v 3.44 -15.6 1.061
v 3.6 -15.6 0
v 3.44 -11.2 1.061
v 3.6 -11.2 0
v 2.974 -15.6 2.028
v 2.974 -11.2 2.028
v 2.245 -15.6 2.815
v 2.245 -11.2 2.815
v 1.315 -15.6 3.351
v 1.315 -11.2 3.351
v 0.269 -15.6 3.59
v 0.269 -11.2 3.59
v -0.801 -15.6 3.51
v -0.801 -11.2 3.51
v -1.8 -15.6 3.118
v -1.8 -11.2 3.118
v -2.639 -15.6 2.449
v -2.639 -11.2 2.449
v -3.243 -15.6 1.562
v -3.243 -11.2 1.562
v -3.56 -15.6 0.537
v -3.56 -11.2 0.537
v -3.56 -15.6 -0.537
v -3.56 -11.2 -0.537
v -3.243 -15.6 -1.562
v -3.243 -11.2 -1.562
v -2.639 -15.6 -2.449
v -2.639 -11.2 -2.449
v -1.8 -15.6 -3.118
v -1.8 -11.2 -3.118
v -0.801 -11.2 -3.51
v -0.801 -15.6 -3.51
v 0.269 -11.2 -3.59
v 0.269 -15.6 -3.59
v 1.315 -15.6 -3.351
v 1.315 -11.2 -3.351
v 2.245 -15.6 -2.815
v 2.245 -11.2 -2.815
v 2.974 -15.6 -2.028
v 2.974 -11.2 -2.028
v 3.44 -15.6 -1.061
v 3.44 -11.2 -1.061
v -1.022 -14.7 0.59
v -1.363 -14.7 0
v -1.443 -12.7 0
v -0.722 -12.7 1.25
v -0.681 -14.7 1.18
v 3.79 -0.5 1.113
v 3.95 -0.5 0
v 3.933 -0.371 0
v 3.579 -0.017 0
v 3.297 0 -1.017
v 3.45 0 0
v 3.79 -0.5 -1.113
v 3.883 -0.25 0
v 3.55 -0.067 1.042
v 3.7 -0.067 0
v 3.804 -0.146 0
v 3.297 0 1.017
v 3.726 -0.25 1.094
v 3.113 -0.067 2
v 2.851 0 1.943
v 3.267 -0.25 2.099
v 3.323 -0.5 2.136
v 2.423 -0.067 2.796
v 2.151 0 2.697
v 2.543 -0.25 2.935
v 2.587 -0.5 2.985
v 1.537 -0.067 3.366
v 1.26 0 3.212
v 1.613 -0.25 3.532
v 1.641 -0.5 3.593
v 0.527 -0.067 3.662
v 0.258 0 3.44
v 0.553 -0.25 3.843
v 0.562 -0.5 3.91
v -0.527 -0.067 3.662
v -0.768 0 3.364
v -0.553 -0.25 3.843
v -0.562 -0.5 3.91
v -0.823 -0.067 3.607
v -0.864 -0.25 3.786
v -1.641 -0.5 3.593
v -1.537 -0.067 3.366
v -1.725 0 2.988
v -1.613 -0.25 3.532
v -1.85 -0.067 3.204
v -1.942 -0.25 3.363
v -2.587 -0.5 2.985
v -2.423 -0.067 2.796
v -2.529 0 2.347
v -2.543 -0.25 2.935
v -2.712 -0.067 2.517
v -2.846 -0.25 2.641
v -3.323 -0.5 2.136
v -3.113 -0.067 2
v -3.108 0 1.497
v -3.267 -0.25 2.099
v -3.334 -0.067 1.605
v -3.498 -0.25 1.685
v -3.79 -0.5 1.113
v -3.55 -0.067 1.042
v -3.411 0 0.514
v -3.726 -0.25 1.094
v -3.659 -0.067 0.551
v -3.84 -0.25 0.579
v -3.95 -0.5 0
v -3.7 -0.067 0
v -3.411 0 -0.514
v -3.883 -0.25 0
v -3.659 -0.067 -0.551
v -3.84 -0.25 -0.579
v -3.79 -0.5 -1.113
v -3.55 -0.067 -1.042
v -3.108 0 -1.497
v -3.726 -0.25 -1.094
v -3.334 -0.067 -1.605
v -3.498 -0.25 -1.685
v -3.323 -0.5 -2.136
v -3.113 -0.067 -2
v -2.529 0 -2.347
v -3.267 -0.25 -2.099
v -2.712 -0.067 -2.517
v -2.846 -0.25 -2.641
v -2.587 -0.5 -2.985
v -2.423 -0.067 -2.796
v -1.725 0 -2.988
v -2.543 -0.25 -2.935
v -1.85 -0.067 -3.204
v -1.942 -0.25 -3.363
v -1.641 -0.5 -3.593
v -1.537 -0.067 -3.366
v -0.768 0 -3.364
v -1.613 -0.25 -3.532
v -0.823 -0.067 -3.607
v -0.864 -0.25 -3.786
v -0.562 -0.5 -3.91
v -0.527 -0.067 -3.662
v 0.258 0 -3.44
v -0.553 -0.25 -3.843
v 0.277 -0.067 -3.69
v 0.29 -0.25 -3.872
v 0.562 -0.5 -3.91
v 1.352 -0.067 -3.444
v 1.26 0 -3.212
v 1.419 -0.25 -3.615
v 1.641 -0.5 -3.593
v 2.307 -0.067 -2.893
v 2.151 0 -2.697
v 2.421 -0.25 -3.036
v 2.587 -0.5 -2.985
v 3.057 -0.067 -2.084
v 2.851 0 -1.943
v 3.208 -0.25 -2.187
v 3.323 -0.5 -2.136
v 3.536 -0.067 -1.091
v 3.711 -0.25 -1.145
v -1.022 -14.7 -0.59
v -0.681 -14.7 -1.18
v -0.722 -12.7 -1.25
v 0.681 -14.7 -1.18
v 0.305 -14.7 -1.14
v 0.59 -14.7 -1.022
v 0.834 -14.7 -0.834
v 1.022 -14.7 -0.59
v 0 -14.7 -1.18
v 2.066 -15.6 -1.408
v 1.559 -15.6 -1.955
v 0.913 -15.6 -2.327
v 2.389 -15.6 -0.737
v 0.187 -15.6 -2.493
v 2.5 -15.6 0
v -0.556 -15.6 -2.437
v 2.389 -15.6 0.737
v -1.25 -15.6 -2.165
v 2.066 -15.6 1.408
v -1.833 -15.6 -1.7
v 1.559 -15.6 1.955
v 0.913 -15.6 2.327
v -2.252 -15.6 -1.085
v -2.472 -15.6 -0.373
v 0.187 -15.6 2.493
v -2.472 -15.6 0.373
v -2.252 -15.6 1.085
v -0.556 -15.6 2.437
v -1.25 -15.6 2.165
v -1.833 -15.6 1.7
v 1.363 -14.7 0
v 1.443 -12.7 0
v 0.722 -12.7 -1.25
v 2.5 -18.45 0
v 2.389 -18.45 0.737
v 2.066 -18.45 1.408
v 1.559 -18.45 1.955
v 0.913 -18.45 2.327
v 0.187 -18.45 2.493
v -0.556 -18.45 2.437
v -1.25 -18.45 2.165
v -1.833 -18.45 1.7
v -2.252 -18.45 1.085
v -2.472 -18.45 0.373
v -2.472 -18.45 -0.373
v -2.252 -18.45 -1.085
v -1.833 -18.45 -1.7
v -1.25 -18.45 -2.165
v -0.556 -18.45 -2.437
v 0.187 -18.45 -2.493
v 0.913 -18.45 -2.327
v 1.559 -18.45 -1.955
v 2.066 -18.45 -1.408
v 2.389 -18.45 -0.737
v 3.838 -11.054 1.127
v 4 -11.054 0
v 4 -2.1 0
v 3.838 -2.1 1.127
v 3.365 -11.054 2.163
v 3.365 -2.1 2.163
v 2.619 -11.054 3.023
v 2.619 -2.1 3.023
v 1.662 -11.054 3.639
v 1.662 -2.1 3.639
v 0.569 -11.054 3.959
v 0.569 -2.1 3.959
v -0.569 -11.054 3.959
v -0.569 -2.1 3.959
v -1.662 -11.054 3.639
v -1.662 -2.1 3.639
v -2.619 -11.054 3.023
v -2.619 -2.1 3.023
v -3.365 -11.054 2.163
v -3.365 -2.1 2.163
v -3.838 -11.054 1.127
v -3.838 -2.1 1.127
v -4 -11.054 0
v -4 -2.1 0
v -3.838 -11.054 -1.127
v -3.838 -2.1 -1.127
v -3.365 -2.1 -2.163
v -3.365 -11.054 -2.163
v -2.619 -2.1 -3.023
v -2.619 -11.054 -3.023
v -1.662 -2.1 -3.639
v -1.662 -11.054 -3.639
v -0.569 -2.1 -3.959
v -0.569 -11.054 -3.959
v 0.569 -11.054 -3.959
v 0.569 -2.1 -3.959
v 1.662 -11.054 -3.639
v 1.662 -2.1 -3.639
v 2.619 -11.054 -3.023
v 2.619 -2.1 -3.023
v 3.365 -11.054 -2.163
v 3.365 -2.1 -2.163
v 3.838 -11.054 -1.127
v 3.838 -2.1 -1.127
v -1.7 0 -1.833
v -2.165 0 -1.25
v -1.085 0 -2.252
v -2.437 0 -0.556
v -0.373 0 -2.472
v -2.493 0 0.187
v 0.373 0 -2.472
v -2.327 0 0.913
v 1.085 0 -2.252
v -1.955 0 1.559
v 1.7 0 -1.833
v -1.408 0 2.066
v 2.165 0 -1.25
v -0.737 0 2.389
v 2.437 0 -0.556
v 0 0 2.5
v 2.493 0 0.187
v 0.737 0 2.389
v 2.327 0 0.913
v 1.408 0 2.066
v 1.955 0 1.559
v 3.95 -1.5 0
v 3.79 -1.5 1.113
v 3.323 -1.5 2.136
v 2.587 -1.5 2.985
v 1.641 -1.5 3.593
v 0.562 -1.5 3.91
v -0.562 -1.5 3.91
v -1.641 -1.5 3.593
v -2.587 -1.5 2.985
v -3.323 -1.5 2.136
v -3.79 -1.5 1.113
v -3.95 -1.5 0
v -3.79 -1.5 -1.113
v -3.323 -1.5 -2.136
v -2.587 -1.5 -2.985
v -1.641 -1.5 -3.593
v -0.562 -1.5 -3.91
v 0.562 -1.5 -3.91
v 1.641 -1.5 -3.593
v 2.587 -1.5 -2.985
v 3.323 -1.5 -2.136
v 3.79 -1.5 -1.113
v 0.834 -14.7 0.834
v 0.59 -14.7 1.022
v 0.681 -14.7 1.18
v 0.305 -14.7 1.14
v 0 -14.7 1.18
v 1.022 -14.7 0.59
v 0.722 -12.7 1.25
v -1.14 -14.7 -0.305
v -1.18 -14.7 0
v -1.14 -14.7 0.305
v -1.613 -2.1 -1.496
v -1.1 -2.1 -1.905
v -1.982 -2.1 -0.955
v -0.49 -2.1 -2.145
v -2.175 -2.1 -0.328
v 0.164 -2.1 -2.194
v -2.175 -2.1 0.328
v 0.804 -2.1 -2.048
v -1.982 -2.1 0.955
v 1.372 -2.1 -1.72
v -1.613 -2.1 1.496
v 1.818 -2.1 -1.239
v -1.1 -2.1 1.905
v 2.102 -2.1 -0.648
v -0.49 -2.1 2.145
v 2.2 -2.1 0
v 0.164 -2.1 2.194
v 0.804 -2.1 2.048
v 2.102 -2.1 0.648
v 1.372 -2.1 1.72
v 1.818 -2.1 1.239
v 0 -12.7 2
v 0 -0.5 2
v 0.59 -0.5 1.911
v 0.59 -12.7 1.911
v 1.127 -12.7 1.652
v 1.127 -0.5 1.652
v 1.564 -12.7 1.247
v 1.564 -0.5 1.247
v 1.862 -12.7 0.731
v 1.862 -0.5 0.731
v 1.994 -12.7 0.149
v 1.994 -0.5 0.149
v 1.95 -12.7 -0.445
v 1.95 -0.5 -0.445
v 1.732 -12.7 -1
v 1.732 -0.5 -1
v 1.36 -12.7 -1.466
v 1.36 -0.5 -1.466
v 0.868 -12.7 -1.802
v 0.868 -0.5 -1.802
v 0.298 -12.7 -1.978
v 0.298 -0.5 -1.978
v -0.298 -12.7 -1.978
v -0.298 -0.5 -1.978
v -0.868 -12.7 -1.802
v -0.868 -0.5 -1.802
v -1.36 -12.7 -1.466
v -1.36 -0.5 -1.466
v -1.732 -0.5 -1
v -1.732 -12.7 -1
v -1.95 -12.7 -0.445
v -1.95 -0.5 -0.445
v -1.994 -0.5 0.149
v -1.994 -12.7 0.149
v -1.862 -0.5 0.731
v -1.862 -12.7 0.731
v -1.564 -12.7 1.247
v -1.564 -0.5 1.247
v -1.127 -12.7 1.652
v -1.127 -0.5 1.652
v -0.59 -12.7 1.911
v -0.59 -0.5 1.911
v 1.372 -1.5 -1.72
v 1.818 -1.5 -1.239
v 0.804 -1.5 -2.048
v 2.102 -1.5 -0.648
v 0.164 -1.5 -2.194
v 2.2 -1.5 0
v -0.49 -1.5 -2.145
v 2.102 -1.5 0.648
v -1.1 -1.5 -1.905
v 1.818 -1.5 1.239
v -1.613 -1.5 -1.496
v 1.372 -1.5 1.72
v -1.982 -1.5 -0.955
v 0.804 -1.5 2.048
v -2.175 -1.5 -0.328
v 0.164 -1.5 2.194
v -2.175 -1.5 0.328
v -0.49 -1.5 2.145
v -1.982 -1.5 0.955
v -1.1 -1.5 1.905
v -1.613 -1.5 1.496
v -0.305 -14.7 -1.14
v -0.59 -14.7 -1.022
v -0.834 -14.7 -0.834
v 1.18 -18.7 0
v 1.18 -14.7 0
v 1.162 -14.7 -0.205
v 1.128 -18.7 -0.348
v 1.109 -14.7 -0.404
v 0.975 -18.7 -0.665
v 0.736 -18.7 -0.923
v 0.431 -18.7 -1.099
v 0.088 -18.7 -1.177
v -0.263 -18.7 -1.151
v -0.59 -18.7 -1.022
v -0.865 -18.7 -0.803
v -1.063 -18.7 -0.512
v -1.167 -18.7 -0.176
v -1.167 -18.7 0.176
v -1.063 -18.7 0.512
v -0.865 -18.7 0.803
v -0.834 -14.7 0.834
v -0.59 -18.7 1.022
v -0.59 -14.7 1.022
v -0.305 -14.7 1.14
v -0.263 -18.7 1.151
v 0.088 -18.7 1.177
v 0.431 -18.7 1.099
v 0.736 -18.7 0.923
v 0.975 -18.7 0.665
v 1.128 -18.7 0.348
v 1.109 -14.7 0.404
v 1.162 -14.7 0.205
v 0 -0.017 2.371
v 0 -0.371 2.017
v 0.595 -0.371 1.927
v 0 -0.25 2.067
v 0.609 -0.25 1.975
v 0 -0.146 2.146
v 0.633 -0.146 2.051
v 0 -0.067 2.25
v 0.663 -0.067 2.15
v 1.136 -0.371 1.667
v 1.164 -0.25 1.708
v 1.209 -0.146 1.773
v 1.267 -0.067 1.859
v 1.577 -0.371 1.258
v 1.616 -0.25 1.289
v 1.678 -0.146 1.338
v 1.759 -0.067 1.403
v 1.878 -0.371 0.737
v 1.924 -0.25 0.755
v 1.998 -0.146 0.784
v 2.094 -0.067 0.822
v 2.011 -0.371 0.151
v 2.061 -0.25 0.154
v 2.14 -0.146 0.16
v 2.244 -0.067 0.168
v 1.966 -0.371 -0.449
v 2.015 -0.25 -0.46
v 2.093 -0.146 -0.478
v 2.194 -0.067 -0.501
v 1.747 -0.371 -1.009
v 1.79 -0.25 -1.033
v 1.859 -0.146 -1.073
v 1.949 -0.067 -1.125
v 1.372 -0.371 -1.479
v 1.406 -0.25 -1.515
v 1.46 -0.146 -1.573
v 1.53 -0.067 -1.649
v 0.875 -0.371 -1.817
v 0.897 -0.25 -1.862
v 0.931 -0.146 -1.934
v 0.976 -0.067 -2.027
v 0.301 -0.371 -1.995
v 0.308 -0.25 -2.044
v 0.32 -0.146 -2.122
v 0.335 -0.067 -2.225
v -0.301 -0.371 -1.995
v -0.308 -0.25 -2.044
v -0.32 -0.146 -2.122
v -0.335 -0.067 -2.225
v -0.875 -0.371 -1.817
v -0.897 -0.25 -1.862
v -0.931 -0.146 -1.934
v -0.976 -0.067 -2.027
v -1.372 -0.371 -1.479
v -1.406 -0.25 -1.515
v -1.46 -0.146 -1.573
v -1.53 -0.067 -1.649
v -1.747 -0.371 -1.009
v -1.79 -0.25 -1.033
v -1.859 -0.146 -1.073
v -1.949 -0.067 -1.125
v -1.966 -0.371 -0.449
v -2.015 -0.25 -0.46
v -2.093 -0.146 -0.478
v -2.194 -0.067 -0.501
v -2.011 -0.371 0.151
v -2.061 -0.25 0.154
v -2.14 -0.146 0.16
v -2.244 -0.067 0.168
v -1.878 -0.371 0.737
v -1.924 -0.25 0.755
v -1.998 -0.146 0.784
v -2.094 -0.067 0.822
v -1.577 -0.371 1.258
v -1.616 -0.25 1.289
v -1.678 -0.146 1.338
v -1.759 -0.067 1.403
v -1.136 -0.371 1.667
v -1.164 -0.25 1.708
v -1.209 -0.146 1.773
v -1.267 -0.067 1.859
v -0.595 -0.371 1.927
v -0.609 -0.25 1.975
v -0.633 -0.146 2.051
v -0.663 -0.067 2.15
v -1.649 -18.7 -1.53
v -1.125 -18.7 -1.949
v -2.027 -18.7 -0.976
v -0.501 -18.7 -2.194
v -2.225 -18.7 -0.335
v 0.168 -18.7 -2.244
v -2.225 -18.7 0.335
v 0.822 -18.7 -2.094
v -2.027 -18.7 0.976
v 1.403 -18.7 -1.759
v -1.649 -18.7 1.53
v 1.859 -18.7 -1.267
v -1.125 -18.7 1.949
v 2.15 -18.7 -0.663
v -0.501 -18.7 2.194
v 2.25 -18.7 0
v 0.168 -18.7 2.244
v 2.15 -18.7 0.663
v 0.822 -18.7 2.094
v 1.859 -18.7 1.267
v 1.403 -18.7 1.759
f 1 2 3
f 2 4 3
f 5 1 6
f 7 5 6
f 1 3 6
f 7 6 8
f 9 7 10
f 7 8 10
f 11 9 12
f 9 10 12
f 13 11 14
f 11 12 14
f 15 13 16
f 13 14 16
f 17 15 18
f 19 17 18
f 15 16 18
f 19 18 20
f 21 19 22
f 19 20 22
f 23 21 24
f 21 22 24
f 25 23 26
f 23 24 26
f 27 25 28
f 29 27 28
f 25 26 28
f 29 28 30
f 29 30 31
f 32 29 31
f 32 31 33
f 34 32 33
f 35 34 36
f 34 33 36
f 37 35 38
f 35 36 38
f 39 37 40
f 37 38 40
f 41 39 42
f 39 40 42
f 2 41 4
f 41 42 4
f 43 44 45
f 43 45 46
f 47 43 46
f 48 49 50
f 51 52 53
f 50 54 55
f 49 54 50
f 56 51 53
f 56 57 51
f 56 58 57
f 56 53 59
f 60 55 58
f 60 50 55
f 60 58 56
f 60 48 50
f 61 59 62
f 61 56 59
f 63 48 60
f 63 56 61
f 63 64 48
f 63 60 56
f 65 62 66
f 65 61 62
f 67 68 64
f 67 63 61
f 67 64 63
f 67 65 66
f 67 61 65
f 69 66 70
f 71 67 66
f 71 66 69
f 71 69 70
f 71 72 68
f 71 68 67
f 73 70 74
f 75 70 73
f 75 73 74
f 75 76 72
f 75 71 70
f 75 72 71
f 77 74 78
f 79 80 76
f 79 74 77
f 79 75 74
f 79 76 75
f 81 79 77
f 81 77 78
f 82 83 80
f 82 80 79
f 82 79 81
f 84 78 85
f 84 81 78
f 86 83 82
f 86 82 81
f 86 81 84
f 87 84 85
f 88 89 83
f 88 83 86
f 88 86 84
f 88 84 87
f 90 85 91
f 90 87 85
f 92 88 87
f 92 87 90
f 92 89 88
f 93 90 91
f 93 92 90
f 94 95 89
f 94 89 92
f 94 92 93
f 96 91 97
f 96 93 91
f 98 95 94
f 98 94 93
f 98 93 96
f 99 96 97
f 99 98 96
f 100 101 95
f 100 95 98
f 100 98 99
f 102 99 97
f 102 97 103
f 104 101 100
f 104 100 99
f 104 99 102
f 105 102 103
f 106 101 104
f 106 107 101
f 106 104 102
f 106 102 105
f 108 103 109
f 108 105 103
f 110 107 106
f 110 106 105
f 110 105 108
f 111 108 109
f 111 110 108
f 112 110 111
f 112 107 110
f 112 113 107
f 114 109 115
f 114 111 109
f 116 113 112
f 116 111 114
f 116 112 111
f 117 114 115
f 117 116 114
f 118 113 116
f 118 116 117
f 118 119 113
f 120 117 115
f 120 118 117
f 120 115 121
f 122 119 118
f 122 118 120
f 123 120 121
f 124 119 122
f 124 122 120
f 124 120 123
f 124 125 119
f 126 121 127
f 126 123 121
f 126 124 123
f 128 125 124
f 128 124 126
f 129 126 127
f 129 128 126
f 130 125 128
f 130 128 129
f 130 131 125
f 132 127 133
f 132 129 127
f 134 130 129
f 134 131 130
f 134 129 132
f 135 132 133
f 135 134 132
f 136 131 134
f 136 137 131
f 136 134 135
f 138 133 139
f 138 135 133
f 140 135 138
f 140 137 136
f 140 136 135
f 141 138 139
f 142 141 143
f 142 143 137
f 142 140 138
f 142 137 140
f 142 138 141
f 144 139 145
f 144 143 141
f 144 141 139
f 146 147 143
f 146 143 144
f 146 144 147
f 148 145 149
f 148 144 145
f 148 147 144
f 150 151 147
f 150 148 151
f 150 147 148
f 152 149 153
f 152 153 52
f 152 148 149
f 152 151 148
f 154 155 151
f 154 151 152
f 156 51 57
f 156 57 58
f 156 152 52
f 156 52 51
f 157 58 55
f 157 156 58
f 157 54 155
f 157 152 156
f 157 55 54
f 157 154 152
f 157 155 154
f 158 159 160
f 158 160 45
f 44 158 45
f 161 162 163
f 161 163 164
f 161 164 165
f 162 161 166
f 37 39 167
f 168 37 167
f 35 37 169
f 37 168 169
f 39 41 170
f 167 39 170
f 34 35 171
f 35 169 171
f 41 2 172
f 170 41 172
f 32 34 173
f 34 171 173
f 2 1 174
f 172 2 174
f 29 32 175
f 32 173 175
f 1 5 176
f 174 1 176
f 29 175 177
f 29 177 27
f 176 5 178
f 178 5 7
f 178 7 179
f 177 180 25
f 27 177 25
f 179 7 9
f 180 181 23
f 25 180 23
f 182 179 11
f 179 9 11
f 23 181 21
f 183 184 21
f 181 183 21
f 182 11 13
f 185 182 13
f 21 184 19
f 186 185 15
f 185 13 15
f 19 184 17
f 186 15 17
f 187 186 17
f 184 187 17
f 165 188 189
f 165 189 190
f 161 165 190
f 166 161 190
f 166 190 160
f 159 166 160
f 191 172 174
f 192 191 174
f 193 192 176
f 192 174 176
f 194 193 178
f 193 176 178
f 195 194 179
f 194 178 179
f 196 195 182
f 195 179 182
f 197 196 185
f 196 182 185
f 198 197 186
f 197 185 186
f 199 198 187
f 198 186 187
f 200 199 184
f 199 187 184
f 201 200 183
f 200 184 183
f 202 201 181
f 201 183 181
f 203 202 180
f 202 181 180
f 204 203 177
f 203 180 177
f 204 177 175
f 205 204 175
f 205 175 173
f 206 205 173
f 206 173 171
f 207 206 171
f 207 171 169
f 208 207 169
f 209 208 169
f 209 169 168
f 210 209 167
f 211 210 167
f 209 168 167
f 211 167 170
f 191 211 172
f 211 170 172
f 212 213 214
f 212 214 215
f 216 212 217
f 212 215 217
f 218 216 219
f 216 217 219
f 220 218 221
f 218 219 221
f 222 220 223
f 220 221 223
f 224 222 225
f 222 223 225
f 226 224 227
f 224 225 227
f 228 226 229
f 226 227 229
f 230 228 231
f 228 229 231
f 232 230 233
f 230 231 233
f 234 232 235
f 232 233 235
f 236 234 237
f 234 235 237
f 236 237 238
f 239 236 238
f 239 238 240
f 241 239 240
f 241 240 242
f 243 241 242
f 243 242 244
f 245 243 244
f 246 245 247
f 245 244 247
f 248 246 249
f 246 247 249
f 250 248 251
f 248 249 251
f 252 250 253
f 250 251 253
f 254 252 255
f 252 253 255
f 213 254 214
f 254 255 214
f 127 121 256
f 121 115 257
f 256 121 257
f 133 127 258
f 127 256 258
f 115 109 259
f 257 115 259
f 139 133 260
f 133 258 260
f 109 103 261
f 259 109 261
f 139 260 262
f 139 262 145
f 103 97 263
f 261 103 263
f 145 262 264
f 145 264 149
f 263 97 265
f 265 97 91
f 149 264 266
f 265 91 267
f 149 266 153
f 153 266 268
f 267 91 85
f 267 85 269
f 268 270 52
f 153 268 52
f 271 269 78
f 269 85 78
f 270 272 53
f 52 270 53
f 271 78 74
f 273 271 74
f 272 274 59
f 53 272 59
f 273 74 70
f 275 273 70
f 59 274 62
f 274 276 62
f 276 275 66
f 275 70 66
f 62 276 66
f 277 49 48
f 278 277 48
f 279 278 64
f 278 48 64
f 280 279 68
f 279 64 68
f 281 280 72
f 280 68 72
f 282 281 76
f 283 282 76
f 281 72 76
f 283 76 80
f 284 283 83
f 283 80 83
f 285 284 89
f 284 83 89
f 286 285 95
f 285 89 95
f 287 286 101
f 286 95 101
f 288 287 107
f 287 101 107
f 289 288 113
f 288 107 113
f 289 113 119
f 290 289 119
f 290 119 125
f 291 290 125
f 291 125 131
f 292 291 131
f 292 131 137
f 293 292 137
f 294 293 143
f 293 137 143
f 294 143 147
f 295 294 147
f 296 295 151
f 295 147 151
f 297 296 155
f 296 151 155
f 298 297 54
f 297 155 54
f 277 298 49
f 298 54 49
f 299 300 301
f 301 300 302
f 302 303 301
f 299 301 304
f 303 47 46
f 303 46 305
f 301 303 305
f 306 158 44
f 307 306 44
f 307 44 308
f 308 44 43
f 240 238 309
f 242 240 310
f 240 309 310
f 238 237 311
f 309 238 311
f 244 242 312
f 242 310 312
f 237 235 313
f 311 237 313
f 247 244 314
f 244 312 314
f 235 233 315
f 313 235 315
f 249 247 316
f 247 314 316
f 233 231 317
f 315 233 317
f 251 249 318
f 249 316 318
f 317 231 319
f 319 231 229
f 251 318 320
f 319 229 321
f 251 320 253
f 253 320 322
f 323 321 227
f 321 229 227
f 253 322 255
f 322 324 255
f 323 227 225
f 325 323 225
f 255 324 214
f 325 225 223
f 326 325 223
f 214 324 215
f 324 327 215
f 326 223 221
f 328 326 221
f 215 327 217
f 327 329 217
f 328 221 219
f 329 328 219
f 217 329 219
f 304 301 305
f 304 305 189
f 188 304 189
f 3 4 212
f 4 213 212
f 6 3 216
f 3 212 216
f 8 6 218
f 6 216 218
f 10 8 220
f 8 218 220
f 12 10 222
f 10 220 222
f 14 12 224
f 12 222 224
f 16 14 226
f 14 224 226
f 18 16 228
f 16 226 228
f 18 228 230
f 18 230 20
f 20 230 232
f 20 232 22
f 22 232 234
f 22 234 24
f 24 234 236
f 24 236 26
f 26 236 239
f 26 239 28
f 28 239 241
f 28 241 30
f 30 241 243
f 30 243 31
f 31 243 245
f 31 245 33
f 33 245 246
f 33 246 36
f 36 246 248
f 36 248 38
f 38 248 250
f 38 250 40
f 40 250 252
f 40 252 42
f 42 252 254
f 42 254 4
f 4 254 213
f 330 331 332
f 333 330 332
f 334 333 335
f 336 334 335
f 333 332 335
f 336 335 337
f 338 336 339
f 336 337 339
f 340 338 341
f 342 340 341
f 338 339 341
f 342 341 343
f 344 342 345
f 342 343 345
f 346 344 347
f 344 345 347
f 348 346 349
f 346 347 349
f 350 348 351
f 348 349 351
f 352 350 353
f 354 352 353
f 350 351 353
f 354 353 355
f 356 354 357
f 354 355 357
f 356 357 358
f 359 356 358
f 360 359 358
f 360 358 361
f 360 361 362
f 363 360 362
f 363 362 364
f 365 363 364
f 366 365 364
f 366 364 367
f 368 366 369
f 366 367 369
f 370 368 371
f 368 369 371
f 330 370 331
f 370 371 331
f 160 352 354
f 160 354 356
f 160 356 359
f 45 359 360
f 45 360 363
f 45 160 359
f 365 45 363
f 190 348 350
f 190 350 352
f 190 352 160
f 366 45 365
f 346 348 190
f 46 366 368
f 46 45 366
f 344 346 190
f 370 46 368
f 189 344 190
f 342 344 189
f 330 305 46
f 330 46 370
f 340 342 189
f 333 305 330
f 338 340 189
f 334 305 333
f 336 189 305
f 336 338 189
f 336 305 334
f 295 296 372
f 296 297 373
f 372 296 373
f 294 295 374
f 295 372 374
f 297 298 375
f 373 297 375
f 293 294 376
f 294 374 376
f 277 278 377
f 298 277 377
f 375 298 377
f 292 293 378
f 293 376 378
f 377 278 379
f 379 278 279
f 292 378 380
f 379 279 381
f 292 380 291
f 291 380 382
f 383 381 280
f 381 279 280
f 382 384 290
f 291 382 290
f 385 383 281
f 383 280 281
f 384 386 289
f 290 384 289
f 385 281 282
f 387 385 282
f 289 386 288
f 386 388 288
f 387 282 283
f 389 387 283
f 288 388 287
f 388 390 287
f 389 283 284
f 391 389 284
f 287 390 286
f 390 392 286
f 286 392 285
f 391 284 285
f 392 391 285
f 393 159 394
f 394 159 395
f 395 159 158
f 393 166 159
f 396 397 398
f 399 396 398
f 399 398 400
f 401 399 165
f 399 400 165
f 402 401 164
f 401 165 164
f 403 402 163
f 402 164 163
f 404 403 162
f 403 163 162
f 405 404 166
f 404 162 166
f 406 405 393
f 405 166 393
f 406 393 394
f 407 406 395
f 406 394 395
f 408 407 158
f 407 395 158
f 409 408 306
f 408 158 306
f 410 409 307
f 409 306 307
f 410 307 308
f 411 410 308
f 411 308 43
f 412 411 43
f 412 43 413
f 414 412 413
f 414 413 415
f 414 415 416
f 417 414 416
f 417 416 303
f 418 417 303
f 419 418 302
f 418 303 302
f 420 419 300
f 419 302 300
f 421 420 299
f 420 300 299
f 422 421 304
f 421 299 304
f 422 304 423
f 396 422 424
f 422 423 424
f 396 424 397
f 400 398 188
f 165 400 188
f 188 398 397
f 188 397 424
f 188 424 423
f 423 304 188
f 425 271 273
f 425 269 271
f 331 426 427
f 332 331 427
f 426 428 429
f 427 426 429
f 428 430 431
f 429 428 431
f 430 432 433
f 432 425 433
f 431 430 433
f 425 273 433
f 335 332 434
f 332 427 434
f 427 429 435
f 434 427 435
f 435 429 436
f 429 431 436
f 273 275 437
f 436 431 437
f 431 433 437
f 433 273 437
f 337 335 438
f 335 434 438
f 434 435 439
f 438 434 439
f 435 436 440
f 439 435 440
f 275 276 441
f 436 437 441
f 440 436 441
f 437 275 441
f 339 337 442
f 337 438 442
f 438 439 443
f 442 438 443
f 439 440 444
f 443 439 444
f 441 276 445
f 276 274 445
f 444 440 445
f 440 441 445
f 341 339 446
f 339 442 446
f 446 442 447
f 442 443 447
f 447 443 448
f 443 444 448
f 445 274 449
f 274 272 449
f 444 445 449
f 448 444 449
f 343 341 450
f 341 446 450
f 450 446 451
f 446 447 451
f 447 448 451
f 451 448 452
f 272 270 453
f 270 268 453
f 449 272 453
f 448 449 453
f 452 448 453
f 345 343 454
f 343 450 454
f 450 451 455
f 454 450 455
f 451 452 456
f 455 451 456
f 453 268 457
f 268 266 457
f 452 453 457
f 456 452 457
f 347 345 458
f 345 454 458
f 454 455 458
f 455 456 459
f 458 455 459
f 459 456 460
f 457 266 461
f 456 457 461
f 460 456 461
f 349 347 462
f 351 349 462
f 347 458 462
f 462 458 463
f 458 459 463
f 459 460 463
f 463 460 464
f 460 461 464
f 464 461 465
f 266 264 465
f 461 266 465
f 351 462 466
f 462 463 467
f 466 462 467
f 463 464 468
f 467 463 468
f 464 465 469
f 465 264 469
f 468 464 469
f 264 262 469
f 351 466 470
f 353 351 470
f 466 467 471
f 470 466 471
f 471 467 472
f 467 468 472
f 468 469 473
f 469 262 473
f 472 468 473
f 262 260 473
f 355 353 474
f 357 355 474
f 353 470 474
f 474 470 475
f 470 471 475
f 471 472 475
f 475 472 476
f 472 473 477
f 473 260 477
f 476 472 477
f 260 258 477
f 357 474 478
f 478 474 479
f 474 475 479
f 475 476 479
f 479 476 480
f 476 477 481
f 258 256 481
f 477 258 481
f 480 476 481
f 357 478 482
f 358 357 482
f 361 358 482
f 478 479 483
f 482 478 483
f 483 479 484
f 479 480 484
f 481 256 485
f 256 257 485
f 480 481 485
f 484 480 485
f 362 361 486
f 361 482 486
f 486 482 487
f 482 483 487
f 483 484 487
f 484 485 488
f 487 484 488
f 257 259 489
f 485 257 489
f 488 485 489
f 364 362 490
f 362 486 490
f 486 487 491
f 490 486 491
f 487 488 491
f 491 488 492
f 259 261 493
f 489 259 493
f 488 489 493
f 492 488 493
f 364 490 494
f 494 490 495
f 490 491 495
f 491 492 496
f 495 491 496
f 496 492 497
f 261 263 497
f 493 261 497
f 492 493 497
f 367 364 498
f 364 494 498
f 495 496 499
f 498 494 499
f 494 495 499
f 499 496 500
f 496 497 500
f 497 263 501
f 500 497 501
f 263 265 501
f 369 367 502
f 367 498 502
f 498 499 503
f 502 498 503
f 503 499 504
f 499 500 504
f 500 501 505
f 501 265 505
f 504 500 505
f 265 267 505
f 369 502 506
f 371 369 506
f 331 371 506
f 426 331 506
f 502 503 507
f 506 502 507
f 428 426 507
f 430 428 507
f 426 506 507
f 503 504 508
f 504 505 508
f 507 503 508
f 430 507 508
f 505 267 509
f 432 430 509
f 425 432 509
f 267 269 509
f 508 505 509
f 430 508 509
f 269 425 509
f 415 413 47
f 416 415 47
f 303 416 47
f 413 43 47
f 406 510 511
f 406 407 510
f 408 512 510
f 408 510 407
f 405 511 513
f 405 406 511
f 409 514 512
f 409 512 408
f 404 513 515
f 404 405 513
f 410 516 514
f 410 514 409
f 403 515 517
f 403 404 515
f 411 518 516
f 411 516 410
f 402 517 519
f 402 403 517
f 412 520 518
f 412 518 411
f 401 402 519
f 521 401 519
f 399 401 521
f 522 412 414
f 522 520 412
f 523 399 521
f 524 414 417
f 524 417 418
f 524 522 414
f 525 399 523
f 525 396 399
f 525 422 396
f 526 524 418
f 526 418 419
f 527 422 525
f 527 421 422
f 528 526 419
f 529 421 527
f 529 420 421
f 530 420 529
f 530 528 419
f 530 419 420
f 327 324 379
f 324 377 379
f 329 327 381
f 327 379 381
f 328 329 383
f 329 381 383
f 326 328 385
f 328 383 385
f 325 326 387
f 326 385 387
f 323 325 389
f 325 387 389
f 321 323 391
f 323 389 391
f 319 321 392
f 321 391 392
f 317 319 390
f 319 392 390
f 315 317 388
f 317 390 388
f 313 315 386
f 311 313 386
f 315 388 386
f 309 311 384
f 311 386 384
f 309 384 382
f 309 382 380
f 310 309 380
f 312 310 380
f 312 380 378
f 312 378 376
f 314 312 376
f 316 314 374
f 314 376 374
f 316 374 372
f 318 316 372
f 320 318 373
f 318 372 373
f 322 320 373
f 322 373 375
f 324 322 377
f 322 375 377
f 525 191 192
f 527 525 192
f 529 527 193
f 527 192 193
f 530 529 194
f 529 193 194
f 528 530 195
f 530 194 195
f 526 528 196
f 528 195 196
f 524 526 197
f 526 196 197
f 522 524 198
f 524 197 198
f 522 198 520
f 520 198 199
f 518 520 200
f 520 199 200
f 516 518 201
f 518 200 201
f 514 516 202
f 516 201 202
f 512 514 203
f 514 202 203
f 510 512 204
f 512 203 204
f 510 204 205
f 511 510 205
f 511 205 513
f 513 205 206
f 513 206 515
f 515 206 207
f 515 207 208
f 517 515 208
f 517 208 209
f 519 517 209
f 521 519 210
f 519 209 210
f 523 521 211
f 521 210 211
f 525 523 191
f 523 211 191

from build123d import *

# Parameters (mm, degrees)
SKETCH2_R                 = 2.5
BOSS_EXTRUDE1_DEPTH       = 3.1
CUT_EXTRUDE1_DEPTH        = 14.7
CUT_EXTRUDE1_TAPER        = 2
SKETCH4_W                 = 2
SKETCH4_H                 = 12.7
F_2_CLEARANCE_HOLE1_D     = 2.360316922
F_2_CLEARANCE_HOLE1_DEPTH = 18.7
CHAMFER1_SIZE             = 0.25
FILLET1_R                 = 0.5


with BuildPart() as part:
    # Sketch1 → Revolve1 (revolve)
    with BuildSketch(Plane.XY):
        Polygon((3.95, 0), (0, 0), (0, -15.6), (3.6, -15.6), (3.6, -11.2), (4, -11.054411906), (4, -2.1), (2.2, -2.1), (2.2, -1.5), (3.95, -1.5), align=None)
    revolve(axis=Axis((0, 0, 0), (0, -1, 0)))

    # Sketch2 → Boss-Extrude1 (add)
    with BuildSketch(Plane.XZ.offset(15.6)):
        Circle(SKETCH2_R)
    extrude(amount=BOSS_EXTRUDE1_DEPTH)

    # Sketch3 → Cut-Extrude1 (cut)
    with BuildSketch(Plane(origin=(0, 0, 0), x_dir=(-1, 0, 0), z_dir=(0, 1, 0))):
        Polygon((0.977739085, -1.693493773), (1.955478171, 0), (0.977739085, 1.693493773), (-0.977739085, 1.693493773), (-1.955478171, 0), (-0.977739085, -1.693493773), align=None)
    extrude(amount=-CUT_EXTRUDE1_DEPTH, taper=CUT_EXTRUDE1_TAPER, mode=Mode.SUBTRACT)

    # Sketch4 → Cut-Revolve1 (revolve, cut)
    with BuildSketch(Plane(origin=(0, 0, 0), x_dir=(0, 0, -1), z_dir=(1, 0, 0))):
        with Locations((-1, -6.35)):
            Rectangle(SKETCH4_W, SKETCH4_H)
    revolve(axis=Axis((0, -12.7, 0), (0, 1, 0)), mode=Mode.SUBTRACT)

    # #2 Clearance Hole1
    with Locations(Plane(origin=(0, -18.7, 0), x_dir=(-1, 0, 0), z_dir=(0, -1, 0))):
        with Locations((0, 0)):
            Hole(F_2_CLEARANCE_HOLE1_D / 2, depth=F_2_CLEARANCE_HOLE1_DEPTH)

    # Chamfer1
    chamfer1_edges = [part.edges().sort_by_distance(p)[0] for p in [
        (-2.5, -18.7, 0),
    ]]
    chamfer(chamfer1_edges, length=CHAMFER1_SIZE)

    # Fillet1
    fillet1_edges = [part.edges().sort_by_distance(p)[0] for p in [
        (-3.95, 0, 0),
        (0, 0, -2),
    ]]
    fillet(fillet1_edges, radius=FILLET1_R)


solid = part.part
